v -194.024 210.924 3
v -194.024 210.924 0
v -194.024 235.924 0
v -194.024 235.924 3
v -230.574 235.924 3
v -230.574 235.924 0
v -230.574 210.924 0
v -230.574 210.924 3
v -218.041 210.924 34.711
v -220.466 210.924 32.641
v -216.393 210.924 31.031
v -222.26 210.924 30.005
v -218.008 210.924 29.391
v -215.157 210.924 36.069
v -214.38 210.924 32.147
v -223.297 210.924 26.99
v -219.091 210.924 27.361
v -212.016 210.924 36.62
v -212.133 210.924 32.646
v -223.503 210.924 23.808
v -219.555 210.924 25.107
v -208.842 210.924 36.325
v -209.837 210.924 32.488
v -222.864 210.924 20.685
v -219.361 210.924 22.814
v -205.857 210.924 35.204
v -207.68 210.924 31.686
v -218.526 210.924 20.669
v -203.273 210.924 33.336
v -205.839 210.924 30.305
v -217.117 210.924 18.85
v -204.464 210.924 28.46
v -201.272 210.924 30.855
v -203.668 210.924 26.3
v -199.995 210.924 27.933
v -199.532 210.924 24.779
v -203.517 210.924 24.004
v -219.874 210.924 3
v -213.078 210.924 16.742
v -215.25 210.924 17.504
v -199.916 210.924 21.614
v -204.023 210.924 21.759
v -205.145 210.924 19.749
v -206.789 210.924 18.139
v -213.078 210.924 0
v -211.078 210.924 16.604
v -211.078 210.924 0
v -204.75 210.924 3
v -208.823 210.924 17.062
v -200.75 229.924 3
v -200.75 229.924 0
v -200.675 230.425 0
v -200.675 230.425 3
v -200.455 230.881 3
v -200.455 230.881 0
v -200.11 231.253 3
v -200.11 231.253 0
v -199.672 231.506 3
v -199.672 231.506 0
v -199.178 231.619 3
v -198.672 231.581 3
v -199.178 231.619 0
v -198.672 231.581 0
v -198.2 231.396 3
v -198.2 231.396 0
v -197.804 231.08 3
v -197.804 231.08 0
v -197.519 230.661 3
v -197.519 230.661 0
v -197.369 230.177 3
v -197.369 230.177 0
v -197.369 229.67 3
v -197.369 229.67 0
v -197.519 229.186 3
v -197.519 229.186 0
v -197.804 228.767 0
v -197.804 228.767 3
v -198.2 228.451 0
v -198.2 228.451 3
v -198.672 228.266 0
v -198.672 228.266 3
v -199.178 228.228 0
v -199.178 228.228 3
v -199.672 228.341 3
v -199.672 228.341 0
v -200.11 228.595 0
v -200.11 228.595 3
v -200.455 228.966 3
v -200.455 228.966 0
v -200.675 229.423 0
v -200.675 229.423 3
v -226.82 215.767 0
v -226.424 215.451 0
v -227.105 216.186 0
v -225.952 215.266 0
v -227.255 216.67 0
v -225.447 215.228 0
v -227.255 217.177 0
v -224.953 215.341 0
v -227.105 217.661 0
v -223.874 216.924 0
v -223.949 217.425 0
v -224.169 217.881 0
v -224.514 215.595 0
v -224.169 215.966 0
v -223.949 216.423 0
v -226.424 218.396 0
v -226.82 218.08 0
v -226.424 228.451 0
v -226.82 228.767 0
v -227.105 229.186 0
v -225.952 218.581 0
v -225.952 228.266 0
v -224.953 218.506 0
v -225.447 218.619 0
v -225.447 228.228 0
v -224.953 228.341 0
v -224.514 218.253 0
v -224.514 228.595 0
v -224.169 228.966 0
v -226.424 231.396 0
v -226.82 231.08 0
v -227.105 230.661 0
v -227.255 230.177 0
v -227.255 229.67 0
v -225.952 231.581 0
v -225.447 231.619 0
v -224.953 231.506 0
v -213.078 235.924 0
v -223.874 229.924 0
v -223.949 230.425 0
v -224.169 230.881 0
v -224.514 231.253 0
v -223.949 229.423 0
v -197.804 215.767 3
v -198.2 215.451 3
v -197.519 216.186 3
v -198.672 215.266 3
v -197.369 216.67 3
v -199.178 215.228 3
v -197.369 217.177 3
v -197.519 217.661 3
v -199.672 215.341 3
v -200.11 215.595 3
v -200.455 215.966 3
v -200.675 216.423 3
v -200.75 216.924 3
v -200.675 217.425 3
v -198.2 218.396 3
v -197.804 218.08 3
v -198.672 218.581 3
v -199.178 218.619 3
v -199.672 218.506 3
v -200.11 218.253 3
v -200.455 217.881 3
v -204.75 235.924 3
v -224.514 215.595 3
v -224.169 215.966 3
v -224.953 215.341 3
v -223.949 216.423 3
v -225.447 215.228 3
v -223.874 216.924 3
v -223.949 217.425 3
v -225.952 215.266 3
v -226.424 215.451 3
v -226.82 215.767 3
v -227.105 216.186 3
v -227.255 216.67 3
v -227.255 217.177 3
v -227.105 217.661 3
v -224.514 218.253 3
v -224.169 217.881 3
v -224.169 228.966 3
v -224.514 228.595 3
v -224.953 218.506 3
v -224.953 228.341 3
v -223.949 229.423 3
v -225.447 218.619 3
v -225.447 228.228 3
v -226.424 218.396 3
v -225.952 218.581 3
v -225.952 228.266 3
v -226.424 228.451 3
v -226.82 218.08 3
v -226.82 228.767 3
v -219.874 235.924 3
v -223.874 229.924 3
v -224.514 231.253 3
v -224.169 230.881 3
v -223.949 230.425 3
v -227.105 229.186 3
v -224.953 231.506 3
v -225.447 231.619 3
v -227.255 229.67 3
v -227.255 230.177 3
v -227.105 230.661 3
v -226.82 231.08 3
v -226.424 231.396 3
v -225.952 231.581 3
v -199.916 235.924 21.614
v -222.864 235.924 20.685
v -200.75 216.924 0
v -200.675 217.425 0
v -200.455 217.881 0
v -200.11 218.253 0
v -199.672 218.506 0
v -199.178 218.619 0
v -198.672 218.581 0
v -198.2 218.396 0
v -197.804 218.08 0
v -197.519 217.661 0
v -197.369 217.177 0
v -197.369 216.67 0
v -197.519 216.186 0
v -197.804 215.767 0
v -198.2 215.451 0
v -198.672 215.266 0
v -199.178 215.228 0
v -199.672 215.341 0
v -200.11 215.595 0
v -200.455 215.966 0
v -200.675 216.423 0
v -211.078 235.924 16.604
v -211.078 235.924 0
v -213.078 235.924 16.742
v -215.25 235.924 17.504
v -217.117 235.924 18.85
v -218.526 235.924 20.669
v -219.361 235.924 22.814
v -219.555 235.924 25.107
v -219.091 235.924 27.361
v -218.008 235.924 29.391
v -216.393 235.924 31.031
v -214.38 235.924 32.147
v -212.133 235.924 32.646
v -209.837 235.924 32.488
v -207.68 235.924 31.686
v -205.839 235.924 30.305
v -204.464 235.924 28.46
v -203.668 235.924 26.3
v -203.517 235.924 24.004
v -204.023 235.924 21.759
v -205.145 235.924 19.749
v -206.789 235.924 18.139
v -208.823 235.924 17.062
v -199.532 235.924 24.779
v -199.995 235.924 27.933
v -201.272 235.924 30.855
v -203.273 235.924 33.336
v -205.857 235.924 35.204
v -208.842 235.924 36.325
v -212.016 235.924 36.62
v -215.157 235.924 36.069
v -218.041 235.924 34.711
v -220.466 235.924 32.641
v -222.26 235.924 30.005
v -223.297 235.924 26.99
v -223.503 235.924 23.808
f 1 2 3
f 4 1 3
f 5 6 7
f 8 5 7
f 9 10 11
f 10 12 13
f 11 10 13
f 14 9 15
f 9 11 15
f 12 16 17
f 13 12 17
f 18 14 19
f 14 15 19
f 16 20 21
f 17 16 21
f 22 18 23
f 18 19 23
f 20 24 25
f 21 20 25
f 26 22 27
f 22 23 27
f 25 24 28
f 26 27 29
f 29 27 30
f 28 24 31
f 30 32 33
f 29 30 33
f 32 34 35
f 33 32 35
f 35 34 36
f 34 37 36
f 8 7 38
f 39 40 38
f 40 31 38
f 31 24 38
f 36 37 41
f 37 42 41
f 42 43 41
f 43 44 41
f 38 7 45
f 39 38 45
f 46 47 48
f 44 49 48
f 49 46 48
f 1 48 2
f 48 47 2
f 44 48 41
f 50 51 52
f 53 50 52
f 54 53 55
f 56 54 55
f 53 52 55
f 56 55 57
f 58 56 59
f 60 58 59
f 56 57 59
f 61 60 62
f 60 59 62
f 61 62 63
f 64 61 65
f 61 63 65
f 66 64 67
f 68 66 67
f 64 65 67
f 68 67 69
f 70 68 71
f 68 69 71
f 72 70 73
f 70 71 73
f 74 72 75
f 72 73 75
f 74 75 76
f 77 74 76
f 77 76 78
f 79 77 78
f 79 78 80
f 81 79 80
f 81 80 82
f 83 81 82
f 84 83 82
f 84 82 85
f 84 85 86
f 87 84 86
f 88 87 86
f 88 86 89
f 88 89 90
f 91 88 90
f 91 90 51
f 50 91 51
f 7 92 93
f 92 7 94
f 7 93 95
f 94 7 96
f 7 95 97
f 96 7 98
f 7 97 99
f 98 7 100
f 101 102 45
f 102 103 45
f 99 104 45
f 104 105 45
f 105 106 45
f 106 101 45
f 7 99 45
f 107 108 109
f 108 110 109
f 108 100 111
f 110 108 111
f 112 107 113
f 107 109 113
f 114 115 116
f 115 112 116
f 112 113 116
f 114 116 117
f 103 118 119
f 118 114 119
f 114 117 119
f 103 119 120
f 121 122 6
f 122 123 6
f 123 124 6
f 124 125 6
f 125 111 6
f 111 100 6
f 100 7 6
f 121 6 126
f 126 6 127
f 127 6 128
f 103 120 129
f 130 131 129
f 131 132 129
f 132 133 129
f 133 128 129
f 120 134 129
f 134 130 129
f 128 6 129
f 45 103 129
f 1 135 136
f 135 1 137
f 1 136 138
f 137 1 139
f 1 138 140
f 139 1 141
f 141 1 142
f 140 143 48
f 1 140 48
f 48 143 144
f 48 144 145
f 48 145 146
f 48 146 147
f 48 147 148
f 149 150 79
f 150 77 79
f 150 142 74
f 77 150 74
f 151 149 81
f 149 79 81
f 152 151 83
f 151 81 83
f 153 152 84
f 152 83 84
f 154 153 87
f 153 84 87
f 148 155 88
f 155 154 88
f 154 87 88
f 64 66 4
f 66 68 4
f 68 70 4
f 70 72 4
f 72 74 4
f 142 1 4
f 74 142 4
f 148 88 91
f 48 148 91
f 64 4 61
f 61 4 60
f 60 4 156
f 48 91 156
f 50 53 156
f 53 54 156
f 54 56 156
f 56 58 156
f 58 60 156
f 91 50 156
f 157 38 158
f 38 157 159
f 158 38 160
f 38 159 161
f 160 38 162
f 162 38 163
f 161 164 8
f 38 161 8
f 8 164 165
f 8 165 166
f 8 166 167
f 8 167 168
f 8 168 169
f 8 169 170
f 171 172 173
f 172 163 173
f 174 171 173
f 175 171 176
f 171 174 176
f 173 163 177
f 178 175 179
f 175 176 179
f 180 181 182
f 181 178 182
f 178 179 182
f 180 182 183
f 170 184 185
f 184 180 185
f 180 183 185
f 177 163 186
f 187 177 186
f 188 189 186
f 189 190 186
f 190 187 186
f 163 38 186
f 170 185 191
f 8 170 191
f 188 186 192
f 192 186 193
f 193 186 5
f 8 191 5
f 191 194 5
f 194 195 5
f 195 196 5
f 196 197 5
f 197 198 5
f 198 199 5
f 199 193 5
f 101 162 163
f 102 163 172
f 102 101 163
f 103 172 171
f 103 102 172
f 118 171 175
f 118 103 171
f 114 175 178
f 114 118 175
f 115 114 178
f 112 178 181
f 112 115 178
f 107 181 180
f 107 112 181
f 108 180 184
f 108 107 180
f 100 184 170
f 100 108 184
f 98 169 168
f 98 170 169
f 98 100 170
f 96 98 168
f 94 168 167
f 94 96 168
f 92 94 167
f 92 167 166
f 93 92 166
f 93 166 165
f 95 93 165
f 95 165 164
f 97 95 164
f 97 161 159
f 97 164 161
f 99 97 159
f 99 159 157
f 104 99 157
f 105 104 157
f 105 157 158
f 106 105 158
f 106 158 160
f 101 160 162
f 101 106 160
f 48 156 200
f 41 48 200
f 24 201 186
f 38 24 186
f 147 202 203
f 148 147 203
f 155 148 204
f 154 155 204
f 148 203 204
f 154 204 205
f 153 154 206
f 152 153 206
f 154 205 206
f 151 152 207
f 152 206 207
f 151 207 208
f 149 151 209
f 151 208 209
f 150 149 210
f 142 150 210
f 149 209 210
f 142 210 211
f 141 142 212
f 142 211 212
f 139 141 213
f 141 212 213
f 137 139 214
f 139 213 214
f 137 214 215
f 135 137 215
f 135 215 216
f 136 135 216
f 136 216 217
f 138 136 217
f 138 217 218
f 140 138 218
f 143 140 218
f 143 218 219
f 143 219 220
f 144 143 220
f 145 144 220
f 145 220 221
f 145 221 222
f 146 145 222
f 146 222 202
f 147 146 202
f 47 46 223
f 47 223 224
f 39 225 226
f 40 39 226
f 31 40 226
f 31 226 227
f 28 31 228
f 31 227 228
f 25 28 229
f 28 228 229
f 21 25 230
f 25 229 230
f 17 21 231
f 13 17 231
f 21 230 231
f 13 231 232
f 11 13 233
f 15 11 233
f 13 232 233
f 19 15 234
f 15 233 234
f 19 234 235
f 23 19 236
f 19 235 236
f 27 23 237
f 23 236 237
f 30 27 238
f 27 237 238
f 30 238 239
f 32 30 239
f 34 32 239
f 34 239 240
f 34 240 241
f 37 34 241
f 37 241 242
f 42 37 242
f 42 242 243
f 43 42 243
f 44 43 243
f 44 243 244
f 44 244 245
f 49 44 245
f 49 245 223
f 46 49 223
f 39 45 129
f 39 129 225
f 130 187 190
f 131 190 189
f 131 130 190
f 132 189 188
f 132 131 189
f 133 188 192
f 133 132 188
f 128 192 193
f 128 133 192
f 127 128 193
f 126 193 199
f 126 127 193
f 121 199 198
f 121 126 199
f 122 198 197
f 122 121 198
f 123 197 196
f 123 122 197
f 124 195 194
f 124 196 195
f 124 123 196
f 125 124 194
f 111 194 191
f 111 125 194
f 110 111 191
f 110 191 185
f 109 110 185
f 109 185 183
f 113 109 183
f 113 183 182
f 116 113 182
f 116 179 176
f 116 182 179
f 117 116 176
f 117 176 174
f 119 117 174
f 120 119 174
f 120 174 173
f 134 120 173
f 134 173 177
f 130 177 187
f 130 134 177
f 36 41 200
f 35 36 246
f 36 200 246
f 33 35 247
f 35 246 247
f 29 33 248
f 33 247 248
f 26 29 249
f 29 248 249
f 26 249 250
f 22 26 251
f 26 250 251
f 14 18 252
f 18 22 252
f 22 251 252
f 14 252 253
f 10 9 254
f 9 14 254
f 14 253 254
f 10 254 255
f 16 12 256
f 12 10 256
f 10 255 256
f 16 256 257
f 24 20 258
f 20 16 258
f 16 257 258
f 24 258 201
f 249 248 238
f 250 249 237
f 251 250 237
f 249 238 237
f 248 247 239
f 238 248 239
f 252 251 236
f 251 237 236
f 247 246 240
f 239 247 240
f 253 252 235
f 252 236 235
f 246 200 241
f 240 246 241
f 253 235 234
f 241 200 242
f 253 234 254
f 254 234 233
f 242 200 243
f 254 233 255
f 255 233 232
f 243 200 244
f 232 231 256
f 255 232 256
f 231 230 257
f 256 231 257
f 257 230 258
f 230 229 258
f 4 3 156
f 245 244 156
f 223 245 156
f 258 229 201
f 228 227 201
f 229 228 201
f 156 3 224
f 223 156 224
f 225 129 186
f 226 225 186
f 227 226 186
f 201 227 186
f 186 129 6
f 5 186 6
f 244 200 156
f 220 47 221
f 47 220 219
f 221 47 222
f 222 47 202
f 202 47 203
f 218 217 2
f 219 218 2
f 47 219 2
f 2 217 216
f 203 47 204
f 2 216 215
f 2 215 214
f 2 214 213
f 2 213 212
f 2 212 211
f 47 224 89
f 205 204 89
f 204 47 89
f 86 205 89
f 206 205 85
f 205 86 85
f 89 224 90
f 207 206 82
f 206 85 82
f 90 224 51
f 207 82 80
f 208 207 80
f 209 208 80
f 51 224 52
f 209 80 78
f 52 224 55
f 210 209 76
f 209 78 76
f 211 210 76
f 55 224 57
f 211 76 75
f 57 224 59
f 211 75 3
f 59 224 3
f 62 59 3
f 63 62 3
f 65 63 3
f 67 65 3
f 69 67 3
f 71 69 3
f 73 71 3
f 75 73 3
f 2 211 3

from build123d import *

# Parameters (mm, degrees)
SKETCH1_R           = 1.7
BOSS_EXTRUDE1_DEPTH = 38
CUT_EXTRUDE1_DEPTH  = 38
SKETCH3_R           = 1.7
CUT_EXTRUDE2_DEPTH  = 9


with BuildPart() as part:
    # Sketch1 → Boss-Extrude1 (new body)
    with BuildSketch(Plane.XY):
        Polygon((-194.023766161, 235.92362241), (-230.573766163, 235.92362241), (-230.573766163, 210.92362241), (-194.023766161, 210.92362241), (-194.023766161, 223.42362241), align=None)
        with Locations((-225.573766163, 216.92362241)):
            Circle(SKETCH1_R, mode=Mode.SUBTRACT)
        with Locations((-225.573766163, 229.92362241)):
            Circle(SKETCH1_R, mode=Mode.SUBTRACT)
    extrude(amount=BOSS_EXTRUDE1_DEPTH)

    # Sketch2 → Cut-Extrude1 (cut)
    with BuildSketch(Plane(origin=(0, 235.92362241, 0), x_dir=(1, 0, 0), z_dir=(0, 1, 0))):
        with BuildLine():
            Line((-213.078407846, 0), (-213.078407846, -16.742061243))
            ThreePointArc((-213.078407846, -16.742061243), (-210.979515598, -32.649316271), (-211.078407846, -16.604493694))
            Line((-211.078407846, -16.604493694), (-211.078407846, 0))
            Line((-211.078407846, 0), (-213.078407846, 0))
        make_face()
        with BuildLine():
            ThreePointArc((-199.916412956, -21.613593286), (-212.016456661, -36.620181105), (-222.864018355, -20.684713088))
            Line((-222.864018355, -20.684713088), (-219.873766163, -3))
            Line((-219.873766163, -3), (-230.573766163, -3))
            Line((-230.573766163, -3), (-230.573766163, -38))
            Line((-230.573766163, -38), (-194.023766161, -38))
            Line((-194.023766161, -38), (-194.023766161, -3))
            Line((-194.023766161, -3), (-204.750473292, -3))
            Line((-204.750473292, -3), (-199.916412956, -21.613593286))
        make_face()
    extrude(amount=-CUT_EXTRUDE1_DEPTH, mode=Mode.SUBTRACT)

    # Sketch3 → Cut-Extrude2 (cut)
    with BuildSketch(Plane(origin=(0, 0, 0), x_dir=(-1, 0, 0), z_dir=(0, 0, -1))):
        with Locations((199.050473293, 216.92362241)):
            Circle(SKETCH3_R)
        with Locations((199.050473293, 229.92362241)):
            Circle(SKETCH3_R)
    extrude(amount=-CUT_EXTRUDE2_DEPTH, mode=Mode.SUBTRACT)


solid = part.part
